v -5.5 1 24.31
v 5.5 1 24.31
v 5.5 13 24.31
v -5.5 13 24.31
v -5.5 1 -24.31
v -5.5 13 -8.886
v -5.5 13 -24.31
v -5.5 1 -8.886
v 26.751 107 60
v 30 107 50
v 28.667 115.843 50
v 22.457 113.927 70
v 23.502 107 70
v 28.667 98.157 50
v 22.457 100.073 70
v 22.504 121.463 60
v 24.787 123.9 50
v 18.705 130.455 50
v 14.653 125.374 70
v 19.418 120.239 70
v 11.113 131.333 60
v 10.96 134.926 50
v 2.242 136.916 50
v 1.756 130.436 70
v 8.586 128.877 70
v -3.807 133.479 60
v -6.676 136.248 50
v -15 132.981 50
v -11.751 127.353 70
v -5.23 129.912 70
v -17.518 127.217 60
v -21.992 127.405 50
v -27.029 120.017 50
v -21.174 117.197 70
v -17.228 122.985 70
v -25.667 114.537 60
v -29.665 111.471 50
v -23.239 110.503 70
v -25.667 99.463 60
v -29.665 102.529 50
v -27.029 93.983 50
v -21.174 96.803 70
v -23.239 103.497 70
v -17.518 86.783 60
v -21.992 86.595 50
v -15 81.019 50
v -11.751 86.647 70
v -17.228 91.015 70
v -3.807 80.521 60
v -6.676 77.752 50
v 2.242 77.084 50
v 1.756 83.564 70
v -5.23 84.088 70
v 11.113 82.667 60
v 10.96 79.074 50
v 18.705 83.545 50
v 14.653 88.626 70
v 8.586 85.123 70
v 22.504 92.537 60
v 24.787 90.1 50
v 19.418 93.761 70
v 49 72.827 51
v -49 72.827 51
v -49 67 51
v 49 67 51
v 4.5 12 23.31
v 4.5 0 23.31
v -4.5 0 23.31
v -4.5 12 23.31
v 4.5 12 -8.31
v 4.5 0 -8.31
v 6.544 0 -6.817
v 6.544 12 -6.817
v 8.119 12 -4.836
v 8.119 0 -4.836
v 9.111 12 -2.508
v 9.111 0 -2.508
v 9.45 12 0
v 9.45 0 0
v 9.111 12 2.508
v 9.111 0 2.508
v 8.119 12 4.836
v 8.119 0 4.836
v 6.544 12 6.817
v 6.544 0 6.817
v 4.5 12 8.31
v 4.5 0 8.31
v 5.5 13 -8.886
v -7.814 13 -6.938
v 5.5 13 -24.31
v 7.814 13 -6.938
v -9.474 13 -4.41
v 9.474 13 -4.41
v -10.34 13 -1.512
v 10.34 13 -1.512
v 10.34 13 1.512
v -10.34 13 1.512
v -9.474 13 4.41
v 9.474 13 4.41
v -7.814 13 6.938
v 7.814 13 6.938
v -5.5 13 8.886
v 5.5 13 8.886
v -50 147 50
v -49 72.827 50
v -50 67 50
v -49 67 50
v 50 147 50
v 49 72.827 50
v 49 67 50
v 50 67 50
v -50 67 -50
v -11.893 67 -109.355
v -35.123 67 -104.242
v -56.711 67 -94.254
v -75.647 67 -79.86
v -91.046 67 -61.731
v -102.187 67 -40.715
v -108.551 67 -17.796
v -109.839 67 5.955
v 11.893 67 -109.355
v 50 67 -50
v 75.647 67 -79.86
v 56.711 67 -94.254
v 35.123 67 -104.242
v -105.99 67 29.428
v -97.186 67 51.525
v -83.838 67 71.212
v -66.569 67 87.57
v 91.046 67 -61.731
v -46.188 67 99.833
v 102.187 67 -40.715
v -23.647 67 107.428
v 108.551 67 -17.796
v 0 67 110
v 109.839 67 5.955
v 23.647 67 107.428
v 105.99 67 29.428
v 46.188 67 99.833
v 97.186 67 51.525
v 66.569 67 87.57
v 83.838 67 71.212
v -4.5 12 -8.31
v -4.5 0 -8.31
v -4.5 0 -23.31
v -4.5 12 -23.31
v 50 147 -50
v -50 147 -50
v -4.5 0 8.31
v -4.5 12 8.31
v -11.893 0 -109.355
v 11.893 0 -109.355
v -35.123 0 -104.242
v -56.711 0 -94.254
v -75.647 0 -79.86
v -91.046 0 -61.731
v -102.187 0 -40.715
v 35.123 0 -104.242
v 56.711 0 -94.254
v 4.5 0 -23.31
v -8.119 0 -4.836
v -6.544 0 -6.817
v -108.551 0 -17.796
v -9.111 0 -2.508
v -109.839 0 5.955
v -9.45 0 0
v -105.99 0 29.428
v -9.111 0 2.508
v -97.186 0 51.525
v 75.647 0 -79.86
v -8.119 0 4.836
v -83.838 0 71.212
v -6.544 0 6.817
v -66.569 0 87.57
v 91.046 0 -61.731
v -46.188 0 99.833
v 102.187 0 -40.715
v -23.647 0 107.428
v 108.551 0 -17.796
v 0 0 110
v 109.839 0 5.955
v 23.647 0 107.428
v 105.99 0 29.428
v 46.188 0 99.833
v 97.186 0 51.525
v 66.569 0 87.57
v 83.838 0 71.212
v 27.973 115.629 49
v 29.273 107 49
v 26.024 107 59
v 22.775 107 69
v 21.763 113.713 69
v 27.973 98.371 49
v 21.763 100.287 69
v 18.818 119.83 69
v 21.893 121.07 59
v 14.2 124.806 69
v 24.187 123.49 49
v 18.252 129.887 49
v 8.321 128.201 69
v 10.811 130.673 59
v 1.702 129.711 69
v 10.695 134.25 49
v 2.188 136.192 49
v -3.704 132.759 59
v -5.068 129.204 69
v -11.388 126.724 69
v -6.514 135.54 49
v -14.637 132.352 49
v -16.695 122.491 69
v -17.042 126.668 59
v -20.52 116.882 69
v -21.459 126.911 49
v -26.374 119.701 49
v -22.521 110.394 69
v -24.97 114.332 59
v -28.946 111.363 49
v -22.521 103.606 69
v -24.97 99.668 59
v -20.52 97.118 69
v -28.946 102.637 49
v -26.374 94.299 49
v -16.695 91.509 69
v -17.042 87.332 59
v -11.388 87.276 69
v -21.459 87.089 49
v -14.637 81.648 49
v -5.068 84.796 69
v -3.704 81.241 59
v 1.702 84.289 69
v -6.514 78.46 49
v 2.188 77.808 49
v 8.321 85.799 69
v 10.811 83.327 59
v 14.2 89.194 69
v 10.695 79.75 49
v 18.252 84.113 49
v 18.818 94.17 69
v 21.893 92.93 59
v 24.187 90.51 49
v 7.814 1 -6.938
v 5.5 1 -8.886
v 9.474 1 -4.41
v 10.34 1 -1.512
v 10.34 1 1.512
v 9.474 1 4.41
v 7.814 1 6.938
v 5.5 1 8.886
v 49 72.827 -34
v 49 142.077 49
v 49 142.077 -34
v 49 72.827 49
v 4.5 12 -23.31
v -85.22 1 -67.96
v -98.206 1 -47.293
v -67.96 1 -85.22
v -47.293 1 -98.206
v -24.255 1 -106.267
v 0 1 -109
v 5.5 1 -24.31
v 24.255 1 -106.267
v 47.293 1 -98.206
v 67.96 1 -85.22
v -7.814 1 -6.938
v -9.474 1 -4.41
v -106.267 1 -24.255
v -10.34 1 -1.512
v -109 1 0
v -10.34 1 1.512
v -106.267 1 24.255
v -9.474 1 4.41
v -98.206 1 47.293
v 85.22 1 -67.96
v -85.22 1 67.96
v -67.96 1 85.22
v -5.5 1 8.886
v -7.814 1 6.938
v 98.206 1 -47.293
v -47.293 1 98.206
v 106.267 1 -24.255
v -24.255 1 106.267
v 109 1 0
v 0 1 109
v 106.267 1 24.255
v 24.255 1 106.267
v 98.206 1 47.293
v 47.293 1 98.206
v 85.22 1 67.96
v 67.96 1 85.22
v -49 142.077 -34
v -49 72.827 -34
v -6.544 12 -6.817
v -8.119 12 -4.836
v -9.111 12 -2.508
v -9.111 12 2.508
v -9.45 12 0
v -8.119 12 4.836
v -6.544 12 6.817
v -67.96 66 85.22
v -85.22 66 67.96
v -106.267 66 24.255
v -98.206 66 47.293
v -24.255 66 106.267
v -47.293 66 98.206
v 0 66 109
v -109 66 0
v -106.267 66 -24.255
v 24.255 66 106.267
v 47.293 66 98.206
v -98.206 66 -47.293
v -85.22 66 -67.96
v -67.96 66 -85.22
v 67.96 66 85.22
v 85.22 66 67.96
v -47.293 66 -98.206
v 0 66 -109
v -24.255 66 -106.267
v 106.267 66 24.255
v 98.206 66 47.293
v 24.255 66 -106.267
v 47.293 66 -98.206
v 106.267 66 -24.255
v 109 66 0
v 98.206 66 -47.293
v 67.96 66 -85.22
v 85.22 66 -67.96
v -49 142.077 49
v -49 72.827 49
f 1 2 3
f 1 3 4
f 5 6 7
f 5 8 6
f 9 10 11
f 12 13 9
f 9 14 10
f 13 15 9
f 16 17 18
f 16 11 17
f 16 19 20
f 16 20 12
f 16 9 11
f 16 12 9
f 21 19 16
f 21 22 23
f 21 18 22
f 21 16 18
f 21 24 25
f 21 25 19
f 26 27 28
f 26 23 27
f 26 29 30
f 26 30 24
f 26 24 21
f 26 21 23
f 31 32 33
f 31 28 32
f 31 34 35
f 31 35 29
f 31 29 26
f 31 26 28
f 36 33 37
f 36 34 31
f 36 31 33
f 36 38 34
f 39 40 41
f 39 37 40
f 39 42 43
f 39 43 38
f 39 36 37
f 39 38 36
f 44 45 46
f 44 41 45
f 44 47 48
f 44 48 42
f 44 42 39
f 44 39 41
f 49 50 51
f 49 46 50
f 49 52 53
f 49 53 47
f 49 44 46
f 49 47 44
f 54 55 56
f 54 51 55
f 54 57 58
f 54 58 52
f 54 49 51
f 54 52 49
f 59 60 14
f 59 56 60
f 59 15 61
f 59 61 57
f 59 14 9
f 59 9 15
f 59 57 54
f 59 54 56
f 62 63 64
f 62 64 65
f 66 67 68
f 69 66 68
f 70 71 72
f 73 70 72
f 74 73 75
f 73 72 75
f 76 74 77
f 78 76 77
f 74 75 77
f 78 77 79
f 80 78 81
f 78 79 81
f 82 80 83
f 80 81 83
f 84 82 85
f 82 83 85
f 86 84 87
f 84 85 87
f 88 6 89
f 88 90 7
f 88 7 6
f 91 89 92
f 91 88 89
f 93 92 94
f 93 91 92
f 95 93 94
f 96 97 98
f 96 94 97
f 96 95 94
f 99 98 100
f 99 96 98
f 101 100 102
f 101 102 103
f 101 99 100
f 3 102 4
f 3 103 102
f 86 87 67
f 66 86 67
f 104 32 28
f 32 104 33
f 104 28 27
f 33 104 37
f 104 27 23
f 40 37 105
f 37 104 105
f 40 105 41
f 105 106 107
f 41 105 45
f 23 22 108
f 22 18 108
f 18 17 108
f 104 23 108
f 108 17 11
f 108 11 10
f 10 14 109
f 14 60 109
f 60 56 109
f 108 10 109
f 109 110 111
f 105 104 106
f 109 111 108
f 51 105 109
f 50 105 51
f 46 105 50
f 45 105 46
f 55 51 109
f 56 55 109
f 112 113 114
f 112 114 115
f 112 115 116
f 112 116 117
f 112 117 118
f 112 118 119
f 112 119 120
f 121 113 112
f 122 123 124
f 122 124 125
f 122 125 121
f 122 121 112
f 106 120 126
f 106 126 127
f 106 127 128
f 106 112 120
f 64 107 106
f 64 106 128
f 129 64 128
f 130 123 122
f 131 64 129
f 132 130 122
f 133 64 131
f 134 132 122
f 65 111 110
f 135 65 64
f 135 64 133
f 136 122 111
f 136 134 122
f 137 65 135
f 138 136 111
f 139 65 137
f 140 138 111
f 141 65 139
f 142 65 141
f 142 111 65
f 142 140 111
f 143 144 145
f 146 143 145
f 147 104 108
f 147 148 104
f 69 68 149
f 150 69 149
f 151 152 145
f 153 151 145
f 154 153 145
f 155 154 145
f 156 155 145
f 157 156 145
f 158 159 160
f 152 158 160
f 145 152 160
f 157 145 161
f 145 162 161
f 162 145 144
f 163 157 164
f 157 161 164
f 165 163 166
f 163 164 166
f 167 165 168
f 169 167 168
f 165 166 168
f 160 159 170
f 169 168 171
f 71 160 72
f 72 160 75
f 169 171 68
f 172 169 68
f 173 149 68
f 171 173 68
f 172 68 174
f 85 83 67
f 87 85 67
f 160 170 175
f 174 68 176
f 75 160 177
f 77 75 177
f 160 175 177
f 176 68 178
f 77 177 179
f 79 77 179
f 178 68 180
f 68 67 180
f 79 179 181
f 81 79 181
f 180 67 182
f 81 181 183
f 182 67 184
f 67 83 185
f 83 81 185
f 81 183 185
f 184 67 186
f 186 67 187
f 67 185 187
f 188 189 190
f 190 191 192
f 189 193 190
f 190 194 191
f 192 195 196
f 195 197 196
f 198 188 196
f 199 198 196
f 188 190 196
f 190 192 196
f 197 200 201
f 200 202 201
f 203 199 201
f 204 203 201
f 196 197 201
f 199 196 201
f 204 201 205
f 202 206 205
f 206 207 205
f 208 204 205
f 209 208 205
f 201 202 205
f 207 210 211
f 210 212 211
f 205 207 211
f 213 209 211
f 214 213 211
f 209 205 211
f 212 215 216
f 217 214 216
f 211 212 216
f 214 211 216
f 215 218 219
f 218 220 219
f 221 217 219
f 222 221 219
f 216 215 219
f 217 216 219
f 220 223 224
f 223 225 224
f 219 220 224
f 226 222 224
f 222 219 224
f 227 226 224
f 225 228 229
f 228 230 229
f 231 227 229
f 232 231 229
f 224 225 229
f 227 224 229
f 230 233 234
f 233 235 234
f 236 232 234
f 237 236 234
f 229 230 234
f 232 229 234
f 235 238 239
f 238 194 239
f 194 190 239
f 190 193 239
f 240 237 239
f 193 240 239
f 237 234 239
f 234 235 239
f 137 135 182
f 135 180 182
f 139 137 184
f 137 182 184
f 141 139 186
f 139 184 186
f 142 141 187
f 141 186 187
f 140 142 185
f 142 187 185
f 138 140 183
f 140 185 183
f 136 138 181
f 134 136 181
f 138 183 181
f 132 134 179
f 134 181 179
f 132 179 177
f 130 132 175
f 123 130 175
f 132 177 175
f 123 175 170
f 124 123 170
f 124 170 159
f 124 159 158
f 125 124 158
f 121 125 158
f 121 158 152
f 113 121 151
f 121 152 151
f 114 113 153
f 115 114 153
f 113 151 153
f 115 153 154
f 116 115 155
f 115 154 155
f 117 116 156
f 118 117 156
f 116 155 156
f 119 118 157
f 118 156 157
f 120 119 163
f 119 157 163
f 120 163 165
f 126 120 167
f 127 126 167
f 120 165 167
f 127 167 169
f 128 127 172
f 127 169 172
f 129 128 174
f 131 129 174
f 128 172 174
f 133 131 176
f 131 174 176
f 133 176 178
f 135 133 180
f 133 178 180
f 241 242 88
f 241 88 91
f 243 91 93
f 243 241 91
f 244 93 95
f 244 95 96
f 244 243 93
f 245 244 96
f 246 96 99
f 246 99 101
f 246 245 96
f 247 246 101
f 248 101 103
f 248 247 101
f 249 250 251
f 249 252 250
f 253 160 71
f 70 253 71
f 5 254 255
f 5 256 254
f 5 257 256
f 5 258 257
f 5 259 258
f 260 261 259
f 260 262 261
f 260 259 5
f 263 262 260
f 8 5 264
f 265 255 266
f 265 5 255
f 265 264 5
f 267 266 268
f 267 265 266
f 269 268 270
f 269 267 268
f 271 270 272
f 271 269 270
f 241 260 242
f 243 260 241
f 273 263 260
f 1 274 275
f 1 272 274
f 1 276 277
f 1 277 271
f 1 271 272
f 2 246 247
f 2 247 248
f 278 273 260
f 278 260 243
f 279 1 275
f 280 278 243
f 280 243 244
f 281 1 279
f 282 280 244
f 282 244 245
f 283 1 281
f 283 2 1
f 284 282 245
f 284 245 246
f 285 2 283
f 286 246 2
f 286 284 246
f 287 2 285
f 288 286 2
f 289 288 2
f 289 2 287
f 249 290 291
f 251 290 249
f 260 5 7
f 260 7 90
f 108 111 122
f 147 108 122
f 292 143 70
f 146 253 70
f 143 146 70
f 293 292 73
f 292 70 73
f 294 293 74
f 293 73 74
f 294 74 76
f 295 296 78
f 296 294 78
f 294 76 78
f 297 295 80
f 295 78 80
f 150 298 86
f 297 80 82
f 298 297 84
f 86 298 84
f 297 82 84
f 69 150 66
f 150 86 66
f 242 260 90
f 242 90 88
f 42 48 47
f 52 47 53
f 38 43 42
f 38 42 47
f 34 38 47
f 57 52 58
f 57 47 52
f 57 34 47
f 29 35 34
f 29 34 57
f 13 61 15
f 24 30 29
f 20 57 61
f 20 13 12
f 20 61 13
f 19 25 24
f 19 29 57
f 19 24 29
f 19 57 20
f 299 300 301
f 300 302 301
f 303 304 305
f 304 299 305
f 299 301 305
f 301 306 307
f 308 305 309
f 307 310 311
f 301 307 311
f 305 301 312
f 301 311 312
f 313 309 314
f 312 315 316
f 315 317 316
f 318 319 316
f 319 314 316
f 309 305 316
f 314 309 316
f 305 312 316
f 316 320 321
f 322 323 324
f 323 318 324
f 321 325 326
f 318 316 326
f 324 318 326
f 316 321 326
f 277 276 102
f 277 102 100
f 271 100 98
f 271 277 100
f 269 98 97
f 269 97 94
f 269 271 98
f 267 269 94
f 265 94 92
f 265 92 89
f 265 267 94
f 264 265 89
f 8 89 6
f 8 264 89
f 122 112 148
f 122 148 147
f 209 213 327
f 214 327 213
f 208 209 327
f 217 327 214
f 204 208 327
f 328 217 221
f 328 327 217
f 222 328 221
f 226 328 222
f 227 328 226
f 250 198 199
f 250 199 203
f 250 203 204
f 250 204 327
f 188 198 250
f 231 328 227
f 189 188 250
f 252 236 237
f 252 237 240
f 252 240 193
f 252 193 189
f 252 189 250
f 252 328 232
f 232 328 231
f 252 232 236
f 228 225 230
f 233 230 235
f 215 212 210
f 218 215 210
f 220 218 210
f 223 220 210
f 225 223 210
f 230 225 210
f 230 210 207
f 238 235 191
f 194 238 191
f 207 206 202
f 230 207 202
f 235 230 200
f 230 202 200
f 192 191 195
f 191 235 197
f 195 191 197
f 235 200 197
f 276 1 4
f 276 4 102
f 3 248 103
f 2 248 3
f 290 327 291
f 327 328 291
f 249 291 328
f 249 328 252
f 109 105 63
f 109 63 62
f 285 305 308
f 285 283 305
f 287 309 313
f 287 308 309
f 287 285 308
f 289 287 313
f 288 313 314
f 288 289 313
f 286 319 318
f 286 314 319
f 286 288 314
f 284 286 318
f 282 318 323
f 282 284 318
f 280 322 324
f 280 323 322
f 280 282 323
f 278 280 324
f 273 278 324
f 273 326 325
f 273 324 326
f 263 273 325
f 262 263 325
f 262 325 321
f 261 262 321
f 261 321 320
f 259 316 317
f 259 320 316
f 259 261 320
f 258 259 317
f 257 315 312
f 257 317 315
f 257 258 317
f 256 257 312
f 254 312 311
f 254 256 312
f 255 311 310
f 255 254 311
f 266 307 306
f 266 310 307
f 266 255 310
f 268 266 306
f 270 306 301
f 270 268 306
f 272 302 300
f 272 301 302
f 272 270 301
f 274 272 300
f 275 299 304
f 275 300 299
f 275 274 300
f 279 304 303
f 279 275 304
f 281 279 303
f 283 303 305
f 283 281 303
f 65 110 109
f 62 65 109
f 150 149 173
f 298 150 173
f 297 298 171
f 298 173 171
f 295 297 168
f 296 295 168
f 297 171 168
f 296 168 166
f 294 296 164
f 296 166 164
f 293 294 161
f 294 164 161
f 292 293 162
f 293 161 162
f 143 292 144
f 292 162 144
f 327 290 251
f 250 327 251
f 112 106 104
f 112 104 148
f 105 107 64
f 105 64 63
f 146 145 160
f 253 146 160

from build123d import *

# Parameters (mm, degrees)
SKETCH1_R           = 110
BOSS_EXTRUDE1_DEPTH = 12
SKETCH2_R           = 110
BOSS_EXTRUDE2_DEPTH = 55
SKETCH3_W           = 100
SKETCH3_H           = 100
BOSS_EXTRUDE3_DEPTH = 80
SKETCH4_R           = 30
BOSS_EXTRUDE4_DEPTH = 20
BOSS_EXTRUDE4_TAPER = 18
SHELL1_T            = -1
SKETCH6_W           = 98
SKETCH6_H           = 6.826689401
BOSS_EXTRUDE5_DEPTH = 100
SKETCH7_W           = 98
SKETCH7_H           = 74.173310599
BOSS_EXTRUDE6_DEPTH = 15
SKETCH8_W           = 98
SKETCH8_H           = 4.922598218
BOSS_EXTRUDE7_DEPTH = 83


with BuildPart() as part:
    # Sketch1 → Boss-Extrude1 (new body)
    with BuildSketch(Plane(origin=(0, 0, 0), x_dir=(1, 0, 0), z_dir=(0, 1, 0))):
        with Locations(Location((0, 0, 0), (0, 0, 270))):
            Circle(SKETCH1_R)
        with BuildLine():
            Line((-4.5, 8.309783391), (-4.5, 23.309783391))
            Line((-4.5, 23.309783391), (4.5, 23.309783391))
            Line((4.5, 23.309783391), (4.5, 8.309783391))
            ThreePointArc((4.5, 8.309783391), (9.45, 0), (4.5, -8.309783391))
            Line((4.5, -8.309783391), (4.5, -23.309783391))
            Line((4.5, -23.309783391), (-4.5, -23.309783391))
            Line((-4.5, -23.309783391), (-4.5, -8.309783391))
            ThreePointArc((-4.5, -8.309783391), (-9.45, 0), (-4.5, 8.309783391))
        make_face(mode=Mode.SUBTRACT)
    extrude(amount=BOSS_EXTRUDE1_DEPTH)

    # Sketch2 → Boss-Extrude2 (add)
    with BuildSketch(Plane(origin=(0, 12, 0), x_dir=(1, 0, 0), z_dir=(0, 1, 0))):
        with Locations(Location((0, 0, 0), (0, 0, 270))):
            Circle(SKETCH2_R)
    extrude(amount=BOSS_EXTRUDE2_DEPTH)

    # Sketch3 → Boss-Extrude3 (add)
    with BuildSketch(Plane(origin=(0, 67, 0), x_dir=(1, 0, 0), z_dir=(0, 1, 0))):
        Rectangle(SKETCH3_W, SKETCH3_H)
    extrude(amount=BOSS_EXTRUDE3_DEPTH)

    # Sketch4 → Boss-Extrude4 (add)
    with BuildSketch(Plane.XY.offset(50)):
        with Locations((0, 107)):
            Circle(SKETCH4_R)
    extrude(amount=BOSS_EXTRUDE4_DEPTH, taper=BOSS_EXTRUDE4_TAPER)

    # Shell1
    shell1_openings = [part.faces().sort_by_distance(p)[0] for p in [
        (0, 147, 0),
    ]]
    offset(amount=SHELL1_T, openings=shell1_openings, kind=Kind.INTERSECTION)

    # Sketch6 → Boss-Extrude5 (add)
    with BuildSketch(Plane.XY.offset(-49)):
        with Locations((0, 69.413344701)):
            Rectangle(SKETCH6_W, SKETCH6_H)
    extrude(amount=BOSS_EXTRUDE5_DEPTH)

    # Sketch7 → Boss-Extrude6 (add)
    with BuildSketch(Plane.XY.offset(-49)):
        with Locations((0, 109.913344701)):
            Rectangle(SKETCH7_W, SKETCH7_H)
    extrude(amount=BOSS_EXTRUDE6_DEPTH)

    # Sketch8 → Boss-Extrude7 (add)
    with BuildSketch(Plane.XY.offset(-34)):
        with Locations((0, 144.538700891)):
            Rectangle(SKETCH8_W, SKETCH8_H)
    extrude(amount=BOSS_EXTRUDE7_DEPTH)


solid = part.part
